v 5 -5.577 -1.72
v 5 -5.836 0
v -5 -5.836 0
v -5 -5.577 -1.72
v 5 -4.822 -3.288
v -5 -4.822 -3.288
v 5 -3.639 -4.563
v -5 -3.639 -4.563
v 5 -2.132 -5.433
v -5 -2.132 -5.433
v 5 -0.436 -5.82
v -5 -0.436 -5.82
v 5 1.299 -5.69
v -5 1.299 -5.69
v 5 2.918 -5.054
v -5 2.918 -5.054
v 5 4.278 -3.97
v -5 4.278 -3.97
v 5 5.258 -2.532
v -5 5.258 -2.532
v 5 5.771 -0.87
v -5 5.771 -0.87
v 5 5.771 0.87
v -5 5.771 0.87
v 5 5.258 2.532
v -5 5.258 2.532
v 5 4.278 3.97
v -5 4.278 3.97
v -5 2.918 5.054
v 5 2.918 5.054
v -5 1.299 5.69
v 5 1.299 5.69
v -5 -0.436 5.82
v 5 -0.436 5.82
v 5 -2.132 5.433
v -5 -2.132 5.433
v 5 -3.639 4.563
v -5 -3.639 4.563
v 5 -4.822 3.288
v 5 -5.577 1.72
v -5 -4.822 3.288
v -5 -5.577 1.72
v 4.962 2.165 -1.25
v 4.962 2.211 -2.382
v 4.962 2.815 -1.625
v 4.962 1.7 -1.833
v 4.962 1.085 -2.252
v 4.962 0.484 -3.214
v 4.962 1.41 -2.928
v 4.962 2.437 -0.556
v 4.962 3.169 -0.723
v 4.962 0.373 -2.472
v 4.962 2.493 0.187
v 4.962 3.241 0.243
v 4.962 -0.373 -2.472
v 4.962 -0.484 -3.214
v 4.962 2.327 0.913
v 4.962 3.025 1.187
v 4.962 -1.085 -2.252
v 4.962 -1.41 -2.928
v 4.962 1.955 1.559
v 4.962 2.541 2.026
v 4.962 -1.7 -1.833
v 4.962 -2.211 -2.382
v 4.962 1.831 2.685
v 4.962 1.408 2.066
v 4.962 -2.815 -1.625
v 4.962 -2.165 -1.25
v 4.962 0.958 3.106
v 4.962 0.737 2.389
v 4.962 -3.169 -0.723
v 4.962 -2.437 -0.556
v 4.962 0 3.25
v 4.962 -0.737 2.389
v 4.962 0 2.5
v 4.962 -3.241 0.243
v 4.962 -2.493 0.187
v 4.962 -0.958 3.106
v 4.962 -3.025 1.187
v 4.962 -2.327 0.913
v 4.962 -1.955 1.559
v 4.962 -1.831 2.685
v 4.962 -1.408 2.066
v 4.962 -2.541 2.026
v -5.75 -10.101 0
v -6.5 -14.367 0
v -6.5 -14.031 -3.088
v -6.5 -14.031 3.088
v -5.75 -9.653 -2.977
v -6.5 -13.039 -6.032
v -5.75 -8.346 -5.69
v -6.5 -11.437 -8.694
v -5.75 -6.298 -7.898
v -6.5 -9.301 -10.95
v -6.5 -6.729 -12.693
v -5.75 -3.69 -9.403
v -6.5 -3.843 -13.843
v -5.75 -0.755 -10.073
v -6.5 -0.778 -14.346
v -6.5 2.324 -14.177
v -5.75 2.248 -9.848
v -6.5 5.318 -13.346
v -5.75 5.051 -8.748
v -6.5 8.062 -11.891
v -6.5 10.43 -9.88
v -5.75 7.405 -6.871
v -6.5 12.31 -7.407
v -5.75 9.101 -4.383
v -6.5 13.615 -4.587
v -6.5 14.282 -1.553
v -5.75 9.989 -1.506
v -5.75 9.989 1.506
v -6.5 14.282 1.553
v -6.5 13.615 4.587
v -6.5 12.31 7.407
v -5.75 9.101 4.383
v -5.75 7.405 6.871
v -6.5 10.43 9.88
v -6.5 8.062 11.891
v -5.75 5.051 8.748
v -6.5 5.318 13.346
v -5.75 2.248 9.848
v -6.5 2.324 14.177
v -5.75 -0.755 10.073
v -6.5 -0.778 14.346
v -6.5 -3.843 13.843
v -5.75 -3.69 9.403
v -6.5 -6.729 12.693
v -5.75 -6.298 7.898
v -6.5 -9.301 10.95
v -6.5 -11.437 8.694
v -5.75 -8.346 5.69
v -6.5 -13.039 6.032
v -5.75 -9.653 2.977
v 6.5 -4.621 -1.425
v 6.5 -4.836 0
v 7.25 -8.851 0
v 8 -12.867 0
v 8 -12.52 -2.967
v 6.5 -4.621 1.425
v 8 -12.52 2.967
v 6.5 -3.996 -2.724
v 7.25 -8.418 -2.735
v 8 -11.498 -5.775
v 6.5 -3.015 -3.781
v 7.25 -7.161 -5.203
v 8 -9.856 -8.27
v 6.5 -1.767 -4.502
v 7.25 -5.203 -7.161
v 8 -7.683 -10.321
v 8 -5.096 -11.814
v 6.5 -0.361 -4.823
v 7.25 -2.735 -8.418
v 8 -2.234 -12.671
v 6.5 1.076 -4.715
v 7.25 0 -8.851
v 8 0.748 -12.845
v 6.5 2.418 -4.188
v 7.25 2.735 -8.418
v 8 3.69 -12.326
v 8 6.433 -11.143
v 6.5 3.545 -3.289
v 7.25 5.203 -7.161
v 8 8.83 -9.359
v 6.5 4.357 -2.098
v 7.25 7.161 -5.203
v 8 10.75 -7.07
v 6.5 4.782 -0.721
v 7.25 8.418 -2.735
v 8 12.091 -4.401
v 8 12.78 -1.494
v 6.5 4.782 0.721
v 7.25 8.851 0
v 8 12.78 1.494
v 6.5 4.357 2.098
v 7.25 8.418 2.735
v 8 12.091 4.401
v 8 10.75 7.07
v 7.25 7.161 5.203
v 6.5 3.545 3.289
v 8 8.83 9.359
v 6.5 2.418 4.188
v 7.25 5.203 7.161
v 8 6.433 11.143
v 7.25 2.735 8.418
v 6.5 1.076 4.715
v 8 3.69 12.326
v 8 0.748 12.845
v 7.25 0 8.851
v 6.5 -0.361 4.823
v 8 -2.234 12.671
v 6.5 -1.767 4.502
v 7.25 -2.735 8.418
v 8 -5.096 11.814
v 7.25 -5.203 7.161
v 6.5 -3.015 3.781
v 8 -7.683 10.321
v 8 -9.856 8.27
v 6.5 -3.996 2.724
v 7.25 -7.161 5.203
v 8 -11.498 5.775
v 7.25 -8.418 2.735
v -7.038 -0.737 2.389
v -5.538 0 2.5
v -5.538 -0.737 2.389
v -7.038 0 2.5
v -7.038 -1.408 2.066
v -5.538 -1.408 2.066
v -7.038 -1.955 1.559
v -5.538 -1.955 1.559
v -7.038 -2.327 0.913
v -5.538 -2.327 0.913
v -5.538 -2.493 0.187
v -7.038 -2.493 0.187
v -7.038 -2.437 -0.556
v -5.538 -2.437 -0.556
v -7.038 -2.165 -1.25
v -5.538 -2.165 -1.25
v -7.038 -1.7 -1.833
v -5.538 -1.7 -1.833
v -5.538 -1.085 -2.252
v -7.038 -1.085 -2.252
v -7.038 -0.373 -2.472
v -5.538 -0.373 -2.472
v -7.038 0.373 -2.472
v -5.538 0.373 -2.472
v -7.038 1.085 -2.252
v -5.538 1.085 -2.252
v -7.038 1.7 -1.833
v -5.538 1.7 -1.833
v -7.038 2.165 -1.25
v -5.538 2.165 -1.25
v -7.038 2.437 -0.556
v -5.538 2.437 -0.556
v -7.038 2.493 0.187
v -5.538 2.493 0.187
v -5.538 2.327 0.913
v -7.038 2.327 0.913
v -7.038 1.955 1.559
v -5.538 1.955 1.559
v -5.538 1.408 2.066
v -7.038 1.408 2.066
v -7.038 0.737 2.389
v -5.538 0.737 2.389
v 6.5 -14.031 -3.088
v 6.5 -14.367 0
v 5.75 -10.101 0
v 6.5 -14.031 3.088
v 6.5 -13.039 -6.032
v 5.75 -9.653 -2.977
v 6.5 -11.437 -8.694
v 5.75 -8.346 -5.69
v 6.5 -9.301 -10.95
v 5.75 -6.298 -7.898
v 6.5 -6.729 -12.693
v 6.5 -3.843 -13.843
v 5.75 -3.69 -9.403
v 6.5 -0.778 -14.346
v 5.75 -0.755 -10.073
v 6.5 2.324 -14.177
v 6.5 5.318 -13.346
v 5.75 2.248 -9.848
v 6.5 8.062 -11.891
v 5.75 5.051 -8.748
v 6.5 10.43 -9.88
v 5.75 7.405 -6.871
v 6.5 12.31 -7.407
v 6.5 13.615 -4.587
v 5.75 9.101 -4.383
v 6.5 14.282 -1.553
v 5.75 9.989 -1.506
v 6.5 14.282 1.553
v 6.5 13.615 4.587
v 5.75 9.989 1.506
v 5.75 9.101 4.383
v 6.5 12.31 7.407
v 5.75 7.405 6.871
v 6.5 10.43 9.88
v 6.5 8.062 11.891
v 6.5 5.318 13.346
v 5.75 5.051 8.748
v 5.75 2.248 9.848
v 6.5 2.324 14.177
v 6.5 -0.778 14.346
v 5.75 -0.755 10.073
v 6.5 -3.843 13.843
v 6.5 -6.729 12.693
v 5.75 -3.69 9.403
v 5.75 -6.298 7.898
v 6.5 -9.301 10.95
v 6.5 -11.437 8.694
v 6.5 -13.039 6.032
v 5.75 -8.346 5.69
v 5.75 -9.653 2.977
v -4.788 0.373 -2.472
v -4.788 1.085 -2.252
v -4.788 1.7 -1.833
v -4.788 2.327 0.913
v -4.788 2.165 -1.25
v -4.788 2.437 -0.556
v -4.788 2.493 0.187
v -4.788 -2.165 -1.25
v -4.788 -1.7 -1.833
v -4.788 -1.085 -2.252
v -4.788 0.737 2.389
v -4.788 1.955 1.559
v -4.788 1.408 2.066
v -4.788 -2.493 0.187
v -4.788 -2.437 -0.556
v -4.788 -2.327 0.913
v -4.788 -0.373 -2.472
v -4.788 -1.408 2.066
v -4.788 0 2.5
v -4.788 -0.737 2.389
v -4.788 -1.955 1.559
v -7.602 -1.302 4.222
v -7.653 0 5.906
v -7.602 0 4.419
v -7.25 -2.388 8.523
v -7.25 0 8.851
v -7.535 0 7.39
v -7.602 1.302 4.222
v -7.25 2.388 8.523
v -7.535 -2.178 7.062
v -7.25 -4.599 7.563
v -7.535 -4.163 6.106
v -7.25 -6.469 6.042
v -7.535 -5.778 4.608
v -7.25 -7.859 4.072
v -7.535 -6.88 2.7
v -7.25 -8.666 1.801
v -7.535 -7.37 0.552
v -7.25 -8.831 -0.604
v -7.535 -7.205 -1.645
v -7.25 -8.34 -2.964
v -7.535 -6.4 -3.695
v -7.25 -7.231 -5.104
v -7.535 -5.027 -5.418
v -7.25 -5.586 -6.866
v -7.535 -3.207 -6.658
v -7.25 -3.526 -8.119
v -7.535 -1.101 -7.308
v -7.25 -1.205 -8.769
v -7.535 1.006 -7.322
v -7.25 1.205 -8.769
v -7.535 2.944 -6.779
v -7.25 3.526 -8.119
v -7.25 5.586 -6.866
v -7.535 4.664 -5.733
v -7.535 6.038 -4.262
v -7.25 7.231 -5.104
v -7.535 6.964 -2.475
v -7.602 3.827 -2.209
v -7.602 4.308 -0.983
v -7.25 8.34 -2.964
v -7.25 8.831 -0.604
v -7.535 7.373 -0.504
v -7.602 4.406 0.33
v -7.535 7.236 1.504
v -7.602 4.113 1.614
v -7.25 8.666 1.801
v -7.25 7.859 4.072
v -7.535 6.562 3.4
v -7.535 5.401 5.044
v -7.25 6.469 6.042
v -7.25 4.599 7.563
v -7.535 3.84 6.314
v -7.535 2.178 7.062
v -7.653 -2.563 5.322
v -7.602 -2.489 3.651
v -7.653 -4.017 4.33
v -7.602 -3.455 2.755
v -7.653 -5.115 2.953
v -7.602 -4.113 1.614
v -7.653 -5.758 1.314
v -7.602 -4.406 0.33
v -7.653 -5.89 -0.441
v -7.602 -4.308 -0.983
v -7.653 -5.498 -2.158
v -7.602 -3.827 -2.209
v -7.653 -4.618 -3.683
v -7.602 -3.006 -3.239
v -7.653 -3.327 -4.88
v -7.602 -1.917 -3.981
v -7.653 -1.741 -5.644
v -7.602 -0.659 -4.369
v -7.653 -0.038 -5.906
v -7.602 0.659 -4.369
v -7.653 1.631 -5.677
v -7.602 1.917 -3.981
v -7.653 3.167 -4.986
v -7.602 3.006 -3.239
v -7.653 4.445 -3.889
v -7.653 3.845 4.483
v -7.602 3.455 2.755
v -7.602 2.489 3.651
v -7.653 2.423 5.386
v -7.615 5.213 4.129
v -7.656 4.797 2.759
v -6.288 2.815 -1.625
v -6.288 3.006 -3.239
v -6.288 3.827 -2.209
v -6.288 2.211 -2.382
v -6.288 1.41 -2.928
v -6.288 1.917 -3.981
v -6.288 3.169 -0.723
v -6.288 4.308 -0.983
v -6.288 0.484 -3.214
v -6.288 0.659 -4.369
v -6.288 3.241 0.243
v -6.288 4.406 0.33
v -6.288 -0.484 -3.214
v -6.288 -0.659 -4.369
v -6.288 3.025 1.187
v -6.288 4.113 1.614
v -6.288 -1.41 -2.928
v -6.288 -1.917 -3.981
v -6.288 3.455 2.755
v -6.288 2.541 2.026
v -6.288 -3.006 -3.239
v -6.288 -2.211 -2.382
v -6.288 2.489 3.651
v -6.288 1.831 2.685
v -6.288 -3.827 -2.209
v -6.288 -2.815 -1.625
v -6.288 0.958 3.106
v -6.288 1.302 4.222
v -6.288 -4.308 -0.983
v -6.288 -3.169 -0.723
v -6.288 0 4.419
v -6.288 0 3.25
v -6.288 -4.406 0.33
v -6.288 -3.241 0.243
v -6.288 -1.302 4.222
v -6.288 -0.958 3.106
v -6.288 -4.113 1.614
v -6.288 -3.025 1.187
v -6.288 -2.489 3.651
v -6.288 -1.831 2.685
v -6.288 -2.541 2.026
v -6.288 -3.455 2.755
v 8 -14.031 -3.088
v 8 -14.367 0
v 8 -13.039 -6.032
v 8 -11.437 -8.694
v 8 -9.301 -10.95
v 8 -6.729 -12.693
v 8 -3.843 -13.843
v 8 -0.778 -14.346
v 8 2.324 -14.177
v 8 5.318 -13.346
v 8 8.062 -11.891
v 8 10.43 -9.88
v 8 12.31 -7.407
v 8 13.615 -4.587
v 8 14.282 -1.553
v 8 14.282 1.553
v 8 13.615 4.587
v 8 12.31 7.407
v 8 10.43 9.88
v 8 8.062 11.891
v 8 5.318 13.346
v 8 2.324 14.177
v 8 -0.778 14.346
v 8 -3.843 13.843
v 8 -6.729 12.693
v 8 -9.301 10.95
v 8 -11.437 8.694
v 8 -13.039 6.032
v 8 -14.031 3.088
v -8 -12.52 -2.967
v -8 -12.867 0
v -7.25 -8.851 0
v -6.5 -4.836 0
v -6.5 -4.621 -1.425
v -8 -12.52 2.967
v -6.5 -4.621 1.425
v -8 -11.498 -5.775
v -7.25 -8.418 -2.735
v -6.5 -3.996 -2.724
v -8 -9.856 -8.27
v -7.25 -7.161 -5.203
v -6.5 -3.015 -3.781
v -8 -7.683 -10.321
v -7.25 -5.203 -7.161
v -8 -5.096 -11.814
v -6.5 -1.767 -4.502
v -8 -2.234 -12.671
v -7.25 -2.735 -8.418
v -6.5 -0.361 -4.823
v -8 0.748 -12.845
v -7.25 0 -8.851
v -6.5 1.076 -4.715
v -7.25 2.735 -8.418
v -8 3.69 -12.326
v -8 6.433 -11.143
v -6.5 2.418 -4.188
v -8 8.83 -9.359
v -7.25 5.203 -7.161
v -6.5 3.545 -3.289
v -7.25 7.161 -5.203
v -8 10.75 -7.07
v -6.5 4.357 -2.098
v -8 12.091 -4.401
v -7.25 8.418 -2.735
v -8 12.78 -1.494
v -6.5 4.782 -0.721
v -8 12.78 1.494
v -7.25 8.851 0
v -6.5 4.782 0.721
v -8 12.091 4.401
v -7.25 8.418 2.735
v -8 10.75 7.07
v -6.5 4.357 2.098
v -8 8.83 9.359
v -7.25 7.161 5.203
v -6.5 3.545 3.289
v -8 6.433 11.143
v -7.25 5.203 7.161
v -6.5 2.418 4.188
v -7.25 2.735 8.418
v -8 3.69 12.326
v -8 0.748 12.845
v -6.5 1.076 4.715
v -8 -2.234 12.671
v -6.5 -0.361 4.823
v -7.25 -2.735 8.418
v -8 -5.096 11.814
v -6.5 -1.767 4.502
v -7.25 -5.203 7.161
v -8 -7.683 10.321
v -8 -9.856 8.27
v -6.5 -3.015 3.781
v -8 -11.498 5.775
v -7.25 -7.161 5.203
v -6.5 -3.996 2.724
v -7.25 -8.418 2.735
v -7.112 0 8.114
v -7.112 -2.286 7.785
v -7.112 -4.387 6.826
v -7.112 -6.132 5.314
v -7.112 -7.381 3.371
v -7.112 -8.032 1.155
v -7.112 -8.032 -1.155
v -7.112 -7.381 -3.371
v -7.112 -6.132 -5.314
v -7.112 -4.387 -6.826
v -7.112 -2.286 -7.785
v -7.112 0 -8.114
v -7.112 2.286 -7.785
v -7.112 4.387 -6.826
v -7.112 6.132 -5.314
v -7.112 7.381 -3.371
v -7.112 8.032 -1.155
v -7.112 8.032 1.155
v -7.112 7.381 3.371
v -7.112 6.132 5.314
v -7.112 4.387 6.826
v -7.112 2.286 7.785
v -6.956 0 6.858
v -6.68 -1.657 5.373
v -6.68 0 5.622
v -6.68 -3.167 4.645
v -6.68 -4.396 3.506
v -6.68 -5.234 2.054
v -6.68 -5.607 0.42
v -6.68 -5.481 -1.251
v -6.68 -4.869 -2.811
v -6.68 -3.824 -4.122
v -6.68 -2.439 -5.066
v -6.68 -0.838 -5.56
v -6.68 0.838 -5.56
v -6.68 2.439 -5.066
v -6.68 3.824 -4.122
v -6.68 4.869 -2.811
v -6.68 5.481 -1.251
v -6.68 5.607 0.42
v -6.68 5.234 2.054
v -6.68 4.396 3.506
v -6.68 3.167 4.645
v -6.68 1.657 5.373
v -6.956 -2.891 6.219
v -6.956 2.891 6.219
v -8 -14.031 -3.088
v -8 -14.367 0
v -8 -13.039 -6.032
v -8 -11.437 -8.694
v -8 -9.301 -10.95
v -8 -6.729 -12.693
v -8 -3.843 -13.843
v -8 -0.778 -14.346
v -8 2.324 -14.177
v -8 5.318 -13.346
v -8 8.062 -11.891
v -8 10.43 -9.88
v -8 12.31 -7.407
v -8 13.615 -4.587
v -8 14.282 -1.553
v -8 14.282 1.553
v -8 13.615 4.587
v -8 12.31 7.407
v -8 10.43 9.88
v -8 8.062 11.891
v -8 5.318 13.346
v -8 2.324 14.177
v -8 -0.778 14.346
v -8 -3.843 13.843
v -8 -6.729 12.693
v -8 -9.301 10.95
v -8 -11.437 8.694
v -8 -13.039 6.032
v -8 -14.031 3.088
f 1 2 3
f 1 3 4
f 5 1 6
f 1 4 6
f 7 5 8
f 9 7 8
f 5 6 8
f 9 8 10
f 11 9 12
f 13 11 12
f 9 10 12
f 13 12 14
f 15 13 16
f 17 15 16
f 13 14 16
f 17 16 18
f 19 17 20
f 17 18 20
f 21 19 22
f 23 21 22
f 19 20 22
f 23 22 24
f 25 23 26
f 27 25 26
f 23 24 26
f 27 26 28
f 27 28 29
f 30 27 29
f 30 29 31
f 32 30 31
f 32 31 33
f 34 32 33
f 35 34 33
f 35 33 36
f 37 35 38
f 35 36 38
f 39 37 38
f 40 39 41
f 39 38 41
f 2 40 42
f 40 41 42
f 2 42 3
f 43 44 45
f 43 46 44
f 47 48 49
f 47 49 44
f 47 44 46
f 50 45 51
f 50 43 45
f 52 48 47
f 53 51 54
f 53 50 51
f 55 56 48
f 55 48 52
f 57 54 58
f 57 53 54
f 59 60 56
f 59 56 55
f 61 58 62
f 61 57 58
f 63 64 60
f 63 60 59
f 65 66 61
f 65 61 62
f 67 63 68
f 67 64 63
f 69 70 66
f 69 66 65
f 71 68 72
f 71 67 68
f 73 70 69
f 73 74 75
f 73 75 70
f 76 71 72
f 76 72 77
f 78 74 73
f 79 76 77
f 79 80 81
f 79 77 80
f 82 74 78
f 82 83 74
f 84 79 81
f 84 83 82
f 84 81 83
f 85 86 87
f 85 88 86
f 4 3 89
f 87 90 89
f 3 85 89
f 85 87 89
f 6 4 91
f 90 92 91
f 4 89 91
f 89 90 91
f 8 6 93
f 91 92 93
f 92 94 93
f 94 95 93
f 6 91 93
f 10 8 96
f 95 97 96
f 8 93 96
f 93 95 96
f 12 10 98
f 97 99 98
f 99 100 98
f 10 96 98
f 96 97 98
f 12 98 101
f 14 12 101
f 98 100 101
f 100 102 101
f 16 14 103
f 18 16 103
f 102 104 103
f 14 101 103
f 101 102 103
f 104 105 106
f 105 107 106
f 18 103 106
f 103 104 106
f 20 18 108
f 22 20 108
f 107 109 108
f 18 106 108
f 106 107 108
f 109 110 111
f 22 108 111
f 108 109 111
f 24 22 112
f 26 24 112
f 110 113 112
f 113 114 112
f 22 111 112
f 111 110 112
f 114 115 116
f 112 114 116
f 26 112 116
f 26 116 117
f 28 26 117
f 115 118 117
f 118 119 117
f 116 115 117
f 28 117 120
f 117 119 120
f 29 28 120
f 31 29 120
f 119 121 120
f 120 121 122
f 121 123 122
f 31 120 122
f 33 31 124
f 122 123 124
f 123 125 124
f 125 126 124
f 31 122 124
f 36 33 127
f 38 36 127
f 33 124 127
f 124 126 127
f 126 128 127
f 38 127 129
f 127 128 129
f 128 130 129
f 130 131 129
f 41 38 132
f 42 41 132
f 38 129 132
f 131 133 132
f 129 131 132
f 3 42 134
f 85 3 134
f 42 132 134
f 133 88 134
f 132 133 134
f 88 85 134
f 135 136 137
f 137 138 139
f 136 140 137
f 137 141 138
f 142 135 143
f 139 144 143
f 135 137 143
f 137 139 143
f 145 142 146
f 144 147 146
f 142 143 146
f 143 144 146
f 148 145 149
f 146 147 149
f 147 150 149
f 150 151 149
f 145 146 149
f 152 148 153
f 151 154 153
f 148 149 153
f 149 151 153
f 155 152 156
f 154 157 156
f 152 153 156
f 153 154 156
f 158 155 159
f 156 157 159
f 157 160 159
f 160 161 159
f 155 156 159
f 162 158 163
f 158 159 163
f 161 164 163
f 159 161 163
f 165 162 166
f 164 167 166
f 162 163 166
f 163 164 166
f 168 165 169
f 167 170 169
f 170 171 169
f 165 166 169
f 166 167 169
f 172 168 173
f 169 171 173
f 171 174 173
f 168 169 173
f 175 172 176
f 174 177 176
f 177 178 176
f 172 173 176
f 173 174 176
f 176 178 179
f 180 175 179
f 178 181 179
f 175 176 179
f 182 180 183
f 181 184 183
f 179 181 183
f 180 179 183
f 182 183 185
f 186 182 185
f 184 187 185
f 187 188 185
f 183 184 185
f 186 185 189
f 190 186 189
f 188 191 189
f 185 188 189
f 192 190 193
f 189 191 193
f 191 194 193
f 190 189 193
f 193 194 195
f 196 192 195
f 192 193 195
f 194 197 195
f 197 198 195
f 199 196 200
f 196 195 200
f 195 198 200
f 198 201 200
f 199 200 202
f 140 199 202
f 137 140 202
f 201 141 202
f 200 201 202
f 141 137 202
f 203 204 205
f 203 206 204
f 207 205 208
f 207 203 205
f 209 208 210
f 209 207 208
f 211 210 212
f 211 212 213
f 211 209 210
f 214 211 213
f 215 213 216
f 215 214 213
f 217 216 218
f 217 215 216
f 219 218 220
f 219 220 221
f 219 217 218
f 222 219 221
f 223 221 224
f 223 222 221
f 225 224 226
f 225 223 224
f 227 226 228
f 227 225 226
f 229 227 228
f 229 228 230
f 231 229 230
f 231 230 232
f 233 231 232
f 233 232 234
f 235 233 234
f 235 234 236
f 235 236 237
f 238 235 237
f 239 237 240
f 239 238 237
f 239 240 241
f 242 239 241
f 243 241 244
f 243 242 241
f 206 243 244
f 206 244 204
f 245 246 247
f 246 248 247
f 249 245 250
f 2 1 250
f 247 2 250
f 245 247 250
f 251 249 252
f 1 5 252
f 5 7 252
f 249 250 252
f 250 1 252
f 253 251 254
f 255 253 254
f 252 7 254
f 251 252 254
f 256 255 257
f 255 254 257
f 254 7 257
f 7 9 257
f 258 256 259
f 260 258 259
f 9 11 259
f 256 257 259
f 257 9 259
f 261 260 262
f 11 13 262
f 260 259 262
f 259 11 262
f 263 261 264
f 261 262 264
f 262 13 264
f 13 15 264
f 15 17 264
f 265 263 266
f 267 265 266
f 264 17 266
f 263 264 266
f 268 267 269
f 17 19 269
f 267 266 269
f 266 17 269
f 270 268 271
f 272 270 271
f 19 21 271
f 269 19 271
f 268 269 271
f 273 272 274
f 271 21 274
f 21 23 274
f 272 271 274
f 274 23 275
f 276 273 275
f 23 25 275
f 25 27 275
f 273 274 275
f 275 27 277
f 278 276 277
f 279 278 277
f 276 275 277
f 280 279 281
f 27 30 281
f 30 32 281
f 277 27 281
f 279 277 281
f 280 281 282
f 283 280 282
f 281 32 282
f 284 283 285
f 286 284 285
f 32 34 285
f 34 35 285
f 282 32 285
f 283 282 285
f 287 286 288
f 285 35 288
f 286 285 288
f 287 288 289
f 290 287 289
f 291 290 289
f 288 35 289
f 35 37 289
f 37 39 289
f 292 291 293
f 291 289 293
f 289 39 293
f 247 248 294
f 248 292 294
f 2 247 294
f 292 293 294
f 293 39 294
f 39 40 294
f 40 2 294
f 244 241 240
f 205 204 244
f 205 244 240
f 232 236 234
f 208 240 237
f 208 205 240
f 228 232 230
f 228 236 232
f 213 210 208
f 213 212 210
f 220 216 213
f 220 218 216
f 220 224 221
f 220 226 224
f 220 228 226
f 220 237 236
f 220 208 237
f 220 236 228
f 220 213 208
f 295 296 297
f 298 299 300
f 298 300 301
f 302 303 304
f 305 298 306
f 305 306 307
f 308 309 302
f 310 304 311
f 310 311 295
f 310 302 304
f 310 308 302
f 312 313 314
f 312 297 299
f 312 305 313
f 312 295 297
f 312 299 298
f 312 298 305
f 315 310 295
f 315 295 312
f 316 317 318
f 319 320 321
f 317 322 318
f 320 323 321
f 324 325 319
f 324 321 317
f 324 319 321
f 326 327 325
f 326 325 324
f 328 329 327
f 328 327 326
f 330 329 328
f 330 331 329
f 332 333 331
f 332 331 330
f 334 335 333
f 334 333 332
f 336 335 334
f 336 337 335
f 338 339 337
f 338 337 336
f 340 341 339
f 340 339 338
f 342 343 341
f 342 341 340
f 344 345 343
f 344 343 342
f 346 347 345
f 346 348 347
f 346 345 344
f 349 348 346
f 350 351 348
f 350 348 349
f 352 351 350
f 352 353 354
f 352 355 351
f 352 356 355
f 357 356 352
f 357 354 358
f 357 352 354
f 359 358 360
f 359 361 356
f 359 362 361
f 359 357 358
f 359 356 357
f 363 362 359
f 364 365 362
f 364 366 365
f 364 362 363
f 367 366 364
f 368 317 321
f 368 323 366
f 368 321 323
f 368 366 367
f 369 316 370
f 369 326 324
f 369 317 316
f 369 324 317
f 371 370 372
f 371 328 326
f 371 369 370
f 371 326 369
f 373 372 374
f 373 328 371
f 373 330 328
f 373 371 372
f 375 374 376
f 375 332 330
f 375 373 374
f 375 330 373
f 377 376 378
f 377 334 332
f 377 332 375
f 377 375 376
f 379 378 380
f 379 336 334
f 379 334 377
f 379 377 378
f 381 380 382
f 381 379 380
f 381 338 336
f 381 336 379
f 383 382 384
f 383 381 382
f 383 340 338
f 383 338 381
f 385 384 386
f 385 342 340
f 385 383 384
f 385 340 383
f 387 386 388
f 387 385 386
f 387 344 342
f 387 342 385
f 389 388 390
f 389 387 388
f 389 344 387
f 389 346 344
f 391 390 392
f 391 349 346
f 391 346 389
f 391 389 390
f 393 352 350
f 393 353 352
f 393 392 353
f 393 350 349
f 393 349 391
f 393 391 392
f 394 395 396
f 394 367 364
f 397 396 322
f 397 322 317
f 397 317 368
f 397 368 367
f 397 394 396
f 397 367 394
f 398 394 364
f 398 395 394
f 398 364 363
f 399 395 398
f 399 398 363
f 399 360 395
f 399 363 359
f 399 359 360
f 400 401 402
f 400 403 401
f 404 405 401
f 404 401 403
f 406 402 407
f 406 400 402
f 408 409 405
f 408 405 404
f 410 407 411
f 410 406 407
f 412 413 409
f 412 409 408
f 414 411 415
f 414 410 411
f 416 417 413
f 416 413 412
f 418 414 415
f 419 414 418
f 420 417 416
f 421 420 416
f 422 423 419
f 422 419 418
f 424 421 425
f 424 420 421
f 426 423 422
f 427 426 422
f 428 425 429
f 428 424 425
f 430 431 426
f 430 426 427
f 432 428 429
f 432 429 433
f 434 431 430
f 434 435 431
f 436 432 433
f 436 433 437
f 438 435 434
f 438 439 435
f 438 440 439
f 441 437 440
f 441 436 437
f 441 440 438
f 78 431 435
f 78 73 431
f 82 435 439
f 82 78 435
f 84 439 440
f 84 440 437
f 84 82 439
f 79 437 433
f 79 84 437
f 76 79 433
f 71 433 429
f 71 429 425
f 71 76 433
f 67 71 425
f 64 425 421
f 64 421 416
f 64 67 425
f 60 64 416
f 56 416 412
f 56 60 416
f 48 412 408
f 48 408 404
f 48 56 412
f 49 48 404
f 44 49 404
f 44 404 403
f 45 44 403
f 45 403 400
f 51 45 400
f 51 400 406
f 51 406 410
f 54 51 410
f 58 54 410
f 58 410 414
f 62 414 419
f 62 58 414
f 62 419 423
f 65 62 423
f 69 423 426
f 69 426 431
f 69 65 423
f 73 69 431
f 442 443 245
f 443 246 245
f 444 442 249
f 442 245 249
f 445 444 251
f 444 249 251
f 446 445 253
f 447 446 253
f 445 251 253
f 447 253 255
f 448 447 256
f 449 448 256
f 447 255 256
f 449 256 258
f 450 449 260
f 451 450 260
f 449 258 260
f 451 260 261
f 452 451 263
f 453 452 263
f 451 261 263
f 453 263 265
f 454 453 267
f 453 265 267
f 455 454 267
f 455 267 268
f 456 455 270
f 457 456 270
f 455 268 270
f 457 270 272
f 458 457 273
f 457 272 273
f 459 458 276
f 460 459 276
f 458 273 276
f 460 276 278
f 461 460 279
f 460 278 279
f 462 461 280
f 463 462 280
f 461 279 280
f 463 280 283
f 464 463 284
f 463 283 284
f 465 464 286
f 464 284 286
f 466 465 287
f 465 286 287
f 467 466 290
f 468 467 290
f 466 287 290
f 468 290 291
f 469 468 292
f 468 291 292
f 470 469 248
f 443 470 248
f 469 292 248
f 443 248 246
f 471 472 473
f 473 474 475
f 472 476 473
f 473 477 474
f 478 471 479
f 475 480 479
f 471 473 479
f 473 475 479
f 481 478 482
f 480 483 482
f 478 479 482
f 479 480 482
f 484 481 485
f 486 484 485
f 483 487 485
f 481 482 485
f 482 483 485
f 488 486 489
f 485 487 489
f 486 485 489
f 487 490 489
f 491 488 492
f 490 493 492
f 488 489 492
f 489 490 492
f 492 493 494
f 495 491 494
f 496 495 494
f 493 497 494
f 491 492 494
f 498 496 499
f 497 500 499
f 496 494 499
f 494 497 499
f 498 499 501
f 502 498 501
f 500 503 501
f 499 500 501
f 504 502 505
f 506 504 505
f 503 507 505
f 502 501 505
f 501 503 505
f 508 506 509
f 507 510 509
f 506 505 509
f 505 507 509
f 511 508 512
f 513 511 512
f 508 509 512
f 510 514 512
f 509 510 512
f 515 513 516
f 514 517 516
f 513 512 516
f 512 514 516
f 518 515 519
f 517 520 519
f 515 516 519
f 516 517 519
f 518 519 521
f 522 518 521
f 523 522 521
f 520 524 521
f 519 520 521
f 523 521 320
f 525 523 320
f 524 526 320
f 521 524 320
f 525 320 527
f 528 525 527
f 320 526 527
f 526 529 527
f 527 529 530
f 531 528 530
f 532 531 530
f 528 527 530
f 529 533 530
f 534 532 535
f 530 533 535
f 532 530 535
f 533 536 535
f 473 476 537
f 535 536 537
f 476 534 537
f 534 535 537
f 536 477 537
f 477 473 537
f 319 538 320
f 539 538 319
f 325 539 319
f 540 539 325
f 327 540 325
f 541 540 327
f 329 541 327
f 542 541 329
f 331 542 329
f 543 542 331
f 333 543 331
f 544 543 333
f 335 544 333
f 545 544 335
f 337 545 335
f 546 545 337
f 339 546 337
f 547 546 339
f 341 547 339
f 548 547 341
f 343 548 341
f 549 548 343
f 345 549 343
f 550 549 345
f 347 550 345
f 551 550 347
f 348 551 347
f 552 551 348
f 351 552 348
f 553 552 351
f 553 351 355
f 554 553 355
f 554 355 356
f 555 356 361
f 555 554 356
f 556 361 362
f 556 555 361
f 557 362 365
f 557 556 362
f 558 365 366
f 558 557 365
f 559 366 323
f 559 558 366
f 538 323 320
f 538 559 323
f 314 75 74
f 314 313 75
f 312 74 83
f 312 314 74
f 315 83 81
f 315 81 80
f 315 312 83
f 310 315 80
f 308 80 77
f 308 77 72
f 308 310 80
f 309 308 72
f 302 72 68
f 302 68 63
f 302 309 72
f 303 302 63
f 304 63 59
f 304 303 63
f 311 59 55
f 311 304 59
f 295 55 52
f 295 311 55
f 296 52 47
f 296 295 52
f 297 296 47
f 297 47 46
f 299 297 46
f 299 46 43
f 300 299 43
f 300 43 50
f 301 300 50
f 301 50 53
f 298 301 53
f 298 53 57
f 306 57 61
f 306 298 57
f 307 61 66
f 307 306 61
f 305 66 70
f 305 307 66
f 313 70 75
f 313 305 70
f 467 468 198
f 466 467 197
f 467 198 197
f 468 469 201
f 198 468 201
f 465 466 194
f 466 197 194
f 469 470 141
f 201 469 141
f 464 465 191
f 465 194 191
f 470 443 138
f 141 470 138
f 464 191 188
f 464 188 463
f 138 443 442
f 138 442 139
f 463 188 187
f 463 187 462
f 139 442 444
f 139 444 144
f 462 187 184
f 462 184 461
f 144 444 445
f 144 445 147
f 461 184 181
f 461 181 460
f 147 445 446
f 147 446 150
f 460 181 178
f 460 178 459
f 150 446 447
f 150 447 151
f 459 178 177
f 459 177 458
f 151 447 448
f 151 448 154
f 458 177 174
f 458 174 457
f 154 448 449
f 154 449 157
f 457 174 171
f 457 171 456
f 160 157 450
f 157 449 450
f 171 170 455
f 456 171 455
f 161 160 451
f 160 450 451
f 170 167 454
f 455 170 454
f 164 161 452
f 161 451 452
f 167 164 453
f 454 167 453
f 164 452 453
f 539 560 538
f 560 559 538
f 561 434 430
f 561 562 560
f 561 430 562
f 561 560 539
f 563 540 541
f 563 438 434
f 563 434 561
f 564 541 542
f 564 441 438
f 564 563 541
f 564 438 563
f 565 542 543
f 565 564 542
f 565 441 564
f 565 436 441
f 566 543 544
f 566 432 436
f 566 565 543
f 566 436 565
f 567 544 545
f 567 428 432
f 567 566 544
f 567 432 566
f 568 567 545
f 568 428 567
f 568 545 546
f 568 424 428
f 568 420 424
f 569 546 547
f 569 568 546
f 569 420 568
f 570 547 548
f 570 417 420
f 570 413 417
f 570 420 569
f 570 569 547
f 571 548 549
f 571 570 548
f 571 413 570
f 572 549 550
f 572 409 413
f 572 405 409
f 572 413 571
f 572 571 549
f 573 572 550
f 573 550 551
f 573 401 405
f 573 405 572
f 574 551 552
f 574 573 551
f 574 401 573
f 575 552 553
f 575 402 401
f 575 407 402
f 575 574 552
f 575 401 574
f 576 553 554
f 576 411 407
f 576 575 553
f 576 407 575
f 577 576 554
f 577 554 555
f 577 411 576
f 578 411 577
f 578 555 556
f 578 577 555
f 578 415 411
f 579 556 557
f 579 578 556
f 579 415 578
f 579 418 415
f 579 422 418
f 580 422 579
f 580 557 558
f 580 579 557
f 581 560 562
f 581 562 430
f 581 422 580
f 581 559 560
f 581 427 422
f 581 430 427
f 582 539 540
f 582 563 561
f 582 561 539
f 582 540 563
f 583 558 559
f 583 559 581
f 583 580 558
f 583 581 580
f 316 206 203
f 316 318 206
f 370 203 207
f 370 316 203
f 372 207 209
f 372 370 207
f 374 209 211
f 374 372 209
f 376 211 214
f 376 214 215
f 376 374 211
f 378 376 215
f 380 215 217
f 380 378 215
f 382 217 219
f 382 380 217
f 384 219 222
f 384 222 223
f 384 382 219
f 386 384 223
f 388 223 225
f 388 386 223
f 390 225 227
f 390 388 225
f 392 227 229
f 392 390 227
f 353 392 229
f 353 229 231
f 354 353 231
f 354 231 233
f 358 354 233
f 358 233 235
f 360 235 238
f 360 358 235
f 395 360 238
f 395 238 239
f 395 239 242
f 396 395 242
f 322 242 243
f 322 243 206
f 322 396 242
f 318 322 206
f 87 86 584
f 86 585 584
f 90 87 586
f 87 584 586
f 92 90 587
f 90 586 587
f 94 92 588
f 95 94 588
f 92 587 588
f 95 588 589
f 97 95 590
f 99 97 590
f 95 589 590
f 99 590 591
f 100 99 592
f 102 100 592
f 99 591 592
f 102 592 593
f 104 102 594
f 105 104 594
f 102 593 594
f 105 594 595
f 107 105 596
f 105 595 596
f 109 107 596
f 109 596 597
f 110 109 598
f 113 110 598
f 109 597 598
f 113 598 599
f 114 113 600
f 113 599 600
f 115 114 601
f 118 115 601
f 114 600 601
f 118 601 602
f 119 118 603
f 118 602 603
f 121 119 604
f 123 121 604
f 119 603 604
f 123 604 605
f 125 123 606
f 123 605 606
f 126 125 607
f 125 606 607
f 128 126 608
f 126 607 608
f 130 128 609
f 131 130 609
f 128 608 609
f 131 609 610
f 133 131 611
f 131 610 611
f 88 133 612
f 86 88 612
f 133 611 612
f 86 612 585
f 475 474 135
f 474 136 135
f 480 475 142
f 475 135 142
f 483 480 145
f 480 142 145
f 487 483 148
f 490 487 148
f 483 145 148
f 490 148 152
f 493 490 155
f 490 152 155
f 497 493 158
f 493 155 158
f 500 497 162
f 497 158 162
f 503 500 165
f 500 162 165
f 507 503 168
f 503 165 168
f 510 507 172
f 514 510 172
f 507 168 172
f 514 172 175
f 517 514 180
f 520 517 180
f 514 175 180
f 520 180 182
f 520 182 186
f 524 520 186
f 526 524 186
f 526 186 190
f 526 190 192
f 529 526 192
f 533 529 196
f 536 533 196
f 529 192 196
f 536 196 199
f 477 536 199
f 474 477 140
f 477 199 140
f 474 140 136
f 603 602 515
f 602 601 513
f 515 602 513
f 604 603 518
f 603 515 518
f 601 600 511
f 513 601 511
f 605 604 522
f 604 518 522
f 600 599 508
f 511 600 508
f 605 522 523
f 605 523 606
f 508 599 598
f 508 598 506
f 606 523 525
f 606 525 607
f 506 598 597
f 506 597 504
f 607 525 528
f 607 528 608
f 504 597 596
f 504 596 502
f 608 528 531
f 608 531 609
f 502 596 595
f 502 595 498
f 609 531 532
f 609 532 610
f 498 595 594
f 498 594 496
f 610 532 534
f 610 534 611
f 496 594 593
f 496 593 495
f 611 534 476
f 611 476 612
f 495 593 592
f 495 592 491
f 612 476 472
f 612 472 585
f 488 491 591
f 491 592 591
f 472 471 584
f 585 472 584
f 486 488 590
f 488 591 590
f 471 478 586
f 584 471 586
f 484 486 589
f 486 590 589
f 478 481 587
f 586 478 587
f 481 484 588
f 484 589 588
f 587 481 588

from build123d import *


with BuildPart() as part:
    # Sketch1 → Revolve1 (revolve)
    with BuildSketch(Plane.XY, mode=Mode.PRIVATE) as revolve1_sk:
        Polygon((-6.5, 14.366600049), (-8, 14.366600049), (-8, 12.866600049), (-6.5, 4.836166661), (0, 4.836166661), (0, 5.836166661), (-5, 5.836166661), align=None)
        Polygon((5, 5.836166661), (0, 5.836166661), (0, 4.836166661), (6.5, 4.836166661), (8, 12.866600049), (8, 14.366600049), (6.5, 14.366600049), align=None)
    revolve(revolve1_sk.sketch.rotate(Axis((-5, 0, 0), (1, 0, 0)), 180), axis=Axis((-5, 0, 0), (1, 0, 0)))


with BuildPart() as body_2:
    # Sketch2 → Revolve2 (revolve)
    with BuildSketch(Plane.XY, mode=Mode.PRIVATE) as revolve2_sk:
        with BuildLine():
            Line((-7.25, 8.851383355), (-7.112289713, 8.114134498))
            ThreePointArc((-7.112289713, 8.114134498), (-6.832493775, 6.236938002), (-6.288093085, 4.418757498))
            Line((-6.288093085, 4.418757498), (-6.288093085, 3.25))
            Line((-6.288093085, 3.25), (4.961906915, 3.25))
            Line((4.961906915, 3.25), (4.961906915, 2.5))
            Line((4.961906915, 2.5), (-4.788093085, 2.5))
            Line((-4.788093085, 2.5), (-4.788093085, 0))
            Line((-4.788093085, 0), (-5.538093085, 0))
            Line((-5.538093085, 0), (-5.538093085, 2.5))
            Line((-5.538093085, 2.5), (-7.038093085, 2.5))
            Line((-7.038093085, 2.5), (-7.602335642, 4.418757498))
            ThreePointArc((-7.602335642, 4.418757498), (-7.615169689, 6.650093597), (-7.25, 8.851383355))
        make_face()
    revolve(revolve2_sk.sketch.rotate(Axis((-5.538093085, 0, 0), (1, 0, 0)), 90), axis=Axis((-5.538093085, 0, 0), (1, 0, 0)))


solid = Compound([part.part, body_2.part])
